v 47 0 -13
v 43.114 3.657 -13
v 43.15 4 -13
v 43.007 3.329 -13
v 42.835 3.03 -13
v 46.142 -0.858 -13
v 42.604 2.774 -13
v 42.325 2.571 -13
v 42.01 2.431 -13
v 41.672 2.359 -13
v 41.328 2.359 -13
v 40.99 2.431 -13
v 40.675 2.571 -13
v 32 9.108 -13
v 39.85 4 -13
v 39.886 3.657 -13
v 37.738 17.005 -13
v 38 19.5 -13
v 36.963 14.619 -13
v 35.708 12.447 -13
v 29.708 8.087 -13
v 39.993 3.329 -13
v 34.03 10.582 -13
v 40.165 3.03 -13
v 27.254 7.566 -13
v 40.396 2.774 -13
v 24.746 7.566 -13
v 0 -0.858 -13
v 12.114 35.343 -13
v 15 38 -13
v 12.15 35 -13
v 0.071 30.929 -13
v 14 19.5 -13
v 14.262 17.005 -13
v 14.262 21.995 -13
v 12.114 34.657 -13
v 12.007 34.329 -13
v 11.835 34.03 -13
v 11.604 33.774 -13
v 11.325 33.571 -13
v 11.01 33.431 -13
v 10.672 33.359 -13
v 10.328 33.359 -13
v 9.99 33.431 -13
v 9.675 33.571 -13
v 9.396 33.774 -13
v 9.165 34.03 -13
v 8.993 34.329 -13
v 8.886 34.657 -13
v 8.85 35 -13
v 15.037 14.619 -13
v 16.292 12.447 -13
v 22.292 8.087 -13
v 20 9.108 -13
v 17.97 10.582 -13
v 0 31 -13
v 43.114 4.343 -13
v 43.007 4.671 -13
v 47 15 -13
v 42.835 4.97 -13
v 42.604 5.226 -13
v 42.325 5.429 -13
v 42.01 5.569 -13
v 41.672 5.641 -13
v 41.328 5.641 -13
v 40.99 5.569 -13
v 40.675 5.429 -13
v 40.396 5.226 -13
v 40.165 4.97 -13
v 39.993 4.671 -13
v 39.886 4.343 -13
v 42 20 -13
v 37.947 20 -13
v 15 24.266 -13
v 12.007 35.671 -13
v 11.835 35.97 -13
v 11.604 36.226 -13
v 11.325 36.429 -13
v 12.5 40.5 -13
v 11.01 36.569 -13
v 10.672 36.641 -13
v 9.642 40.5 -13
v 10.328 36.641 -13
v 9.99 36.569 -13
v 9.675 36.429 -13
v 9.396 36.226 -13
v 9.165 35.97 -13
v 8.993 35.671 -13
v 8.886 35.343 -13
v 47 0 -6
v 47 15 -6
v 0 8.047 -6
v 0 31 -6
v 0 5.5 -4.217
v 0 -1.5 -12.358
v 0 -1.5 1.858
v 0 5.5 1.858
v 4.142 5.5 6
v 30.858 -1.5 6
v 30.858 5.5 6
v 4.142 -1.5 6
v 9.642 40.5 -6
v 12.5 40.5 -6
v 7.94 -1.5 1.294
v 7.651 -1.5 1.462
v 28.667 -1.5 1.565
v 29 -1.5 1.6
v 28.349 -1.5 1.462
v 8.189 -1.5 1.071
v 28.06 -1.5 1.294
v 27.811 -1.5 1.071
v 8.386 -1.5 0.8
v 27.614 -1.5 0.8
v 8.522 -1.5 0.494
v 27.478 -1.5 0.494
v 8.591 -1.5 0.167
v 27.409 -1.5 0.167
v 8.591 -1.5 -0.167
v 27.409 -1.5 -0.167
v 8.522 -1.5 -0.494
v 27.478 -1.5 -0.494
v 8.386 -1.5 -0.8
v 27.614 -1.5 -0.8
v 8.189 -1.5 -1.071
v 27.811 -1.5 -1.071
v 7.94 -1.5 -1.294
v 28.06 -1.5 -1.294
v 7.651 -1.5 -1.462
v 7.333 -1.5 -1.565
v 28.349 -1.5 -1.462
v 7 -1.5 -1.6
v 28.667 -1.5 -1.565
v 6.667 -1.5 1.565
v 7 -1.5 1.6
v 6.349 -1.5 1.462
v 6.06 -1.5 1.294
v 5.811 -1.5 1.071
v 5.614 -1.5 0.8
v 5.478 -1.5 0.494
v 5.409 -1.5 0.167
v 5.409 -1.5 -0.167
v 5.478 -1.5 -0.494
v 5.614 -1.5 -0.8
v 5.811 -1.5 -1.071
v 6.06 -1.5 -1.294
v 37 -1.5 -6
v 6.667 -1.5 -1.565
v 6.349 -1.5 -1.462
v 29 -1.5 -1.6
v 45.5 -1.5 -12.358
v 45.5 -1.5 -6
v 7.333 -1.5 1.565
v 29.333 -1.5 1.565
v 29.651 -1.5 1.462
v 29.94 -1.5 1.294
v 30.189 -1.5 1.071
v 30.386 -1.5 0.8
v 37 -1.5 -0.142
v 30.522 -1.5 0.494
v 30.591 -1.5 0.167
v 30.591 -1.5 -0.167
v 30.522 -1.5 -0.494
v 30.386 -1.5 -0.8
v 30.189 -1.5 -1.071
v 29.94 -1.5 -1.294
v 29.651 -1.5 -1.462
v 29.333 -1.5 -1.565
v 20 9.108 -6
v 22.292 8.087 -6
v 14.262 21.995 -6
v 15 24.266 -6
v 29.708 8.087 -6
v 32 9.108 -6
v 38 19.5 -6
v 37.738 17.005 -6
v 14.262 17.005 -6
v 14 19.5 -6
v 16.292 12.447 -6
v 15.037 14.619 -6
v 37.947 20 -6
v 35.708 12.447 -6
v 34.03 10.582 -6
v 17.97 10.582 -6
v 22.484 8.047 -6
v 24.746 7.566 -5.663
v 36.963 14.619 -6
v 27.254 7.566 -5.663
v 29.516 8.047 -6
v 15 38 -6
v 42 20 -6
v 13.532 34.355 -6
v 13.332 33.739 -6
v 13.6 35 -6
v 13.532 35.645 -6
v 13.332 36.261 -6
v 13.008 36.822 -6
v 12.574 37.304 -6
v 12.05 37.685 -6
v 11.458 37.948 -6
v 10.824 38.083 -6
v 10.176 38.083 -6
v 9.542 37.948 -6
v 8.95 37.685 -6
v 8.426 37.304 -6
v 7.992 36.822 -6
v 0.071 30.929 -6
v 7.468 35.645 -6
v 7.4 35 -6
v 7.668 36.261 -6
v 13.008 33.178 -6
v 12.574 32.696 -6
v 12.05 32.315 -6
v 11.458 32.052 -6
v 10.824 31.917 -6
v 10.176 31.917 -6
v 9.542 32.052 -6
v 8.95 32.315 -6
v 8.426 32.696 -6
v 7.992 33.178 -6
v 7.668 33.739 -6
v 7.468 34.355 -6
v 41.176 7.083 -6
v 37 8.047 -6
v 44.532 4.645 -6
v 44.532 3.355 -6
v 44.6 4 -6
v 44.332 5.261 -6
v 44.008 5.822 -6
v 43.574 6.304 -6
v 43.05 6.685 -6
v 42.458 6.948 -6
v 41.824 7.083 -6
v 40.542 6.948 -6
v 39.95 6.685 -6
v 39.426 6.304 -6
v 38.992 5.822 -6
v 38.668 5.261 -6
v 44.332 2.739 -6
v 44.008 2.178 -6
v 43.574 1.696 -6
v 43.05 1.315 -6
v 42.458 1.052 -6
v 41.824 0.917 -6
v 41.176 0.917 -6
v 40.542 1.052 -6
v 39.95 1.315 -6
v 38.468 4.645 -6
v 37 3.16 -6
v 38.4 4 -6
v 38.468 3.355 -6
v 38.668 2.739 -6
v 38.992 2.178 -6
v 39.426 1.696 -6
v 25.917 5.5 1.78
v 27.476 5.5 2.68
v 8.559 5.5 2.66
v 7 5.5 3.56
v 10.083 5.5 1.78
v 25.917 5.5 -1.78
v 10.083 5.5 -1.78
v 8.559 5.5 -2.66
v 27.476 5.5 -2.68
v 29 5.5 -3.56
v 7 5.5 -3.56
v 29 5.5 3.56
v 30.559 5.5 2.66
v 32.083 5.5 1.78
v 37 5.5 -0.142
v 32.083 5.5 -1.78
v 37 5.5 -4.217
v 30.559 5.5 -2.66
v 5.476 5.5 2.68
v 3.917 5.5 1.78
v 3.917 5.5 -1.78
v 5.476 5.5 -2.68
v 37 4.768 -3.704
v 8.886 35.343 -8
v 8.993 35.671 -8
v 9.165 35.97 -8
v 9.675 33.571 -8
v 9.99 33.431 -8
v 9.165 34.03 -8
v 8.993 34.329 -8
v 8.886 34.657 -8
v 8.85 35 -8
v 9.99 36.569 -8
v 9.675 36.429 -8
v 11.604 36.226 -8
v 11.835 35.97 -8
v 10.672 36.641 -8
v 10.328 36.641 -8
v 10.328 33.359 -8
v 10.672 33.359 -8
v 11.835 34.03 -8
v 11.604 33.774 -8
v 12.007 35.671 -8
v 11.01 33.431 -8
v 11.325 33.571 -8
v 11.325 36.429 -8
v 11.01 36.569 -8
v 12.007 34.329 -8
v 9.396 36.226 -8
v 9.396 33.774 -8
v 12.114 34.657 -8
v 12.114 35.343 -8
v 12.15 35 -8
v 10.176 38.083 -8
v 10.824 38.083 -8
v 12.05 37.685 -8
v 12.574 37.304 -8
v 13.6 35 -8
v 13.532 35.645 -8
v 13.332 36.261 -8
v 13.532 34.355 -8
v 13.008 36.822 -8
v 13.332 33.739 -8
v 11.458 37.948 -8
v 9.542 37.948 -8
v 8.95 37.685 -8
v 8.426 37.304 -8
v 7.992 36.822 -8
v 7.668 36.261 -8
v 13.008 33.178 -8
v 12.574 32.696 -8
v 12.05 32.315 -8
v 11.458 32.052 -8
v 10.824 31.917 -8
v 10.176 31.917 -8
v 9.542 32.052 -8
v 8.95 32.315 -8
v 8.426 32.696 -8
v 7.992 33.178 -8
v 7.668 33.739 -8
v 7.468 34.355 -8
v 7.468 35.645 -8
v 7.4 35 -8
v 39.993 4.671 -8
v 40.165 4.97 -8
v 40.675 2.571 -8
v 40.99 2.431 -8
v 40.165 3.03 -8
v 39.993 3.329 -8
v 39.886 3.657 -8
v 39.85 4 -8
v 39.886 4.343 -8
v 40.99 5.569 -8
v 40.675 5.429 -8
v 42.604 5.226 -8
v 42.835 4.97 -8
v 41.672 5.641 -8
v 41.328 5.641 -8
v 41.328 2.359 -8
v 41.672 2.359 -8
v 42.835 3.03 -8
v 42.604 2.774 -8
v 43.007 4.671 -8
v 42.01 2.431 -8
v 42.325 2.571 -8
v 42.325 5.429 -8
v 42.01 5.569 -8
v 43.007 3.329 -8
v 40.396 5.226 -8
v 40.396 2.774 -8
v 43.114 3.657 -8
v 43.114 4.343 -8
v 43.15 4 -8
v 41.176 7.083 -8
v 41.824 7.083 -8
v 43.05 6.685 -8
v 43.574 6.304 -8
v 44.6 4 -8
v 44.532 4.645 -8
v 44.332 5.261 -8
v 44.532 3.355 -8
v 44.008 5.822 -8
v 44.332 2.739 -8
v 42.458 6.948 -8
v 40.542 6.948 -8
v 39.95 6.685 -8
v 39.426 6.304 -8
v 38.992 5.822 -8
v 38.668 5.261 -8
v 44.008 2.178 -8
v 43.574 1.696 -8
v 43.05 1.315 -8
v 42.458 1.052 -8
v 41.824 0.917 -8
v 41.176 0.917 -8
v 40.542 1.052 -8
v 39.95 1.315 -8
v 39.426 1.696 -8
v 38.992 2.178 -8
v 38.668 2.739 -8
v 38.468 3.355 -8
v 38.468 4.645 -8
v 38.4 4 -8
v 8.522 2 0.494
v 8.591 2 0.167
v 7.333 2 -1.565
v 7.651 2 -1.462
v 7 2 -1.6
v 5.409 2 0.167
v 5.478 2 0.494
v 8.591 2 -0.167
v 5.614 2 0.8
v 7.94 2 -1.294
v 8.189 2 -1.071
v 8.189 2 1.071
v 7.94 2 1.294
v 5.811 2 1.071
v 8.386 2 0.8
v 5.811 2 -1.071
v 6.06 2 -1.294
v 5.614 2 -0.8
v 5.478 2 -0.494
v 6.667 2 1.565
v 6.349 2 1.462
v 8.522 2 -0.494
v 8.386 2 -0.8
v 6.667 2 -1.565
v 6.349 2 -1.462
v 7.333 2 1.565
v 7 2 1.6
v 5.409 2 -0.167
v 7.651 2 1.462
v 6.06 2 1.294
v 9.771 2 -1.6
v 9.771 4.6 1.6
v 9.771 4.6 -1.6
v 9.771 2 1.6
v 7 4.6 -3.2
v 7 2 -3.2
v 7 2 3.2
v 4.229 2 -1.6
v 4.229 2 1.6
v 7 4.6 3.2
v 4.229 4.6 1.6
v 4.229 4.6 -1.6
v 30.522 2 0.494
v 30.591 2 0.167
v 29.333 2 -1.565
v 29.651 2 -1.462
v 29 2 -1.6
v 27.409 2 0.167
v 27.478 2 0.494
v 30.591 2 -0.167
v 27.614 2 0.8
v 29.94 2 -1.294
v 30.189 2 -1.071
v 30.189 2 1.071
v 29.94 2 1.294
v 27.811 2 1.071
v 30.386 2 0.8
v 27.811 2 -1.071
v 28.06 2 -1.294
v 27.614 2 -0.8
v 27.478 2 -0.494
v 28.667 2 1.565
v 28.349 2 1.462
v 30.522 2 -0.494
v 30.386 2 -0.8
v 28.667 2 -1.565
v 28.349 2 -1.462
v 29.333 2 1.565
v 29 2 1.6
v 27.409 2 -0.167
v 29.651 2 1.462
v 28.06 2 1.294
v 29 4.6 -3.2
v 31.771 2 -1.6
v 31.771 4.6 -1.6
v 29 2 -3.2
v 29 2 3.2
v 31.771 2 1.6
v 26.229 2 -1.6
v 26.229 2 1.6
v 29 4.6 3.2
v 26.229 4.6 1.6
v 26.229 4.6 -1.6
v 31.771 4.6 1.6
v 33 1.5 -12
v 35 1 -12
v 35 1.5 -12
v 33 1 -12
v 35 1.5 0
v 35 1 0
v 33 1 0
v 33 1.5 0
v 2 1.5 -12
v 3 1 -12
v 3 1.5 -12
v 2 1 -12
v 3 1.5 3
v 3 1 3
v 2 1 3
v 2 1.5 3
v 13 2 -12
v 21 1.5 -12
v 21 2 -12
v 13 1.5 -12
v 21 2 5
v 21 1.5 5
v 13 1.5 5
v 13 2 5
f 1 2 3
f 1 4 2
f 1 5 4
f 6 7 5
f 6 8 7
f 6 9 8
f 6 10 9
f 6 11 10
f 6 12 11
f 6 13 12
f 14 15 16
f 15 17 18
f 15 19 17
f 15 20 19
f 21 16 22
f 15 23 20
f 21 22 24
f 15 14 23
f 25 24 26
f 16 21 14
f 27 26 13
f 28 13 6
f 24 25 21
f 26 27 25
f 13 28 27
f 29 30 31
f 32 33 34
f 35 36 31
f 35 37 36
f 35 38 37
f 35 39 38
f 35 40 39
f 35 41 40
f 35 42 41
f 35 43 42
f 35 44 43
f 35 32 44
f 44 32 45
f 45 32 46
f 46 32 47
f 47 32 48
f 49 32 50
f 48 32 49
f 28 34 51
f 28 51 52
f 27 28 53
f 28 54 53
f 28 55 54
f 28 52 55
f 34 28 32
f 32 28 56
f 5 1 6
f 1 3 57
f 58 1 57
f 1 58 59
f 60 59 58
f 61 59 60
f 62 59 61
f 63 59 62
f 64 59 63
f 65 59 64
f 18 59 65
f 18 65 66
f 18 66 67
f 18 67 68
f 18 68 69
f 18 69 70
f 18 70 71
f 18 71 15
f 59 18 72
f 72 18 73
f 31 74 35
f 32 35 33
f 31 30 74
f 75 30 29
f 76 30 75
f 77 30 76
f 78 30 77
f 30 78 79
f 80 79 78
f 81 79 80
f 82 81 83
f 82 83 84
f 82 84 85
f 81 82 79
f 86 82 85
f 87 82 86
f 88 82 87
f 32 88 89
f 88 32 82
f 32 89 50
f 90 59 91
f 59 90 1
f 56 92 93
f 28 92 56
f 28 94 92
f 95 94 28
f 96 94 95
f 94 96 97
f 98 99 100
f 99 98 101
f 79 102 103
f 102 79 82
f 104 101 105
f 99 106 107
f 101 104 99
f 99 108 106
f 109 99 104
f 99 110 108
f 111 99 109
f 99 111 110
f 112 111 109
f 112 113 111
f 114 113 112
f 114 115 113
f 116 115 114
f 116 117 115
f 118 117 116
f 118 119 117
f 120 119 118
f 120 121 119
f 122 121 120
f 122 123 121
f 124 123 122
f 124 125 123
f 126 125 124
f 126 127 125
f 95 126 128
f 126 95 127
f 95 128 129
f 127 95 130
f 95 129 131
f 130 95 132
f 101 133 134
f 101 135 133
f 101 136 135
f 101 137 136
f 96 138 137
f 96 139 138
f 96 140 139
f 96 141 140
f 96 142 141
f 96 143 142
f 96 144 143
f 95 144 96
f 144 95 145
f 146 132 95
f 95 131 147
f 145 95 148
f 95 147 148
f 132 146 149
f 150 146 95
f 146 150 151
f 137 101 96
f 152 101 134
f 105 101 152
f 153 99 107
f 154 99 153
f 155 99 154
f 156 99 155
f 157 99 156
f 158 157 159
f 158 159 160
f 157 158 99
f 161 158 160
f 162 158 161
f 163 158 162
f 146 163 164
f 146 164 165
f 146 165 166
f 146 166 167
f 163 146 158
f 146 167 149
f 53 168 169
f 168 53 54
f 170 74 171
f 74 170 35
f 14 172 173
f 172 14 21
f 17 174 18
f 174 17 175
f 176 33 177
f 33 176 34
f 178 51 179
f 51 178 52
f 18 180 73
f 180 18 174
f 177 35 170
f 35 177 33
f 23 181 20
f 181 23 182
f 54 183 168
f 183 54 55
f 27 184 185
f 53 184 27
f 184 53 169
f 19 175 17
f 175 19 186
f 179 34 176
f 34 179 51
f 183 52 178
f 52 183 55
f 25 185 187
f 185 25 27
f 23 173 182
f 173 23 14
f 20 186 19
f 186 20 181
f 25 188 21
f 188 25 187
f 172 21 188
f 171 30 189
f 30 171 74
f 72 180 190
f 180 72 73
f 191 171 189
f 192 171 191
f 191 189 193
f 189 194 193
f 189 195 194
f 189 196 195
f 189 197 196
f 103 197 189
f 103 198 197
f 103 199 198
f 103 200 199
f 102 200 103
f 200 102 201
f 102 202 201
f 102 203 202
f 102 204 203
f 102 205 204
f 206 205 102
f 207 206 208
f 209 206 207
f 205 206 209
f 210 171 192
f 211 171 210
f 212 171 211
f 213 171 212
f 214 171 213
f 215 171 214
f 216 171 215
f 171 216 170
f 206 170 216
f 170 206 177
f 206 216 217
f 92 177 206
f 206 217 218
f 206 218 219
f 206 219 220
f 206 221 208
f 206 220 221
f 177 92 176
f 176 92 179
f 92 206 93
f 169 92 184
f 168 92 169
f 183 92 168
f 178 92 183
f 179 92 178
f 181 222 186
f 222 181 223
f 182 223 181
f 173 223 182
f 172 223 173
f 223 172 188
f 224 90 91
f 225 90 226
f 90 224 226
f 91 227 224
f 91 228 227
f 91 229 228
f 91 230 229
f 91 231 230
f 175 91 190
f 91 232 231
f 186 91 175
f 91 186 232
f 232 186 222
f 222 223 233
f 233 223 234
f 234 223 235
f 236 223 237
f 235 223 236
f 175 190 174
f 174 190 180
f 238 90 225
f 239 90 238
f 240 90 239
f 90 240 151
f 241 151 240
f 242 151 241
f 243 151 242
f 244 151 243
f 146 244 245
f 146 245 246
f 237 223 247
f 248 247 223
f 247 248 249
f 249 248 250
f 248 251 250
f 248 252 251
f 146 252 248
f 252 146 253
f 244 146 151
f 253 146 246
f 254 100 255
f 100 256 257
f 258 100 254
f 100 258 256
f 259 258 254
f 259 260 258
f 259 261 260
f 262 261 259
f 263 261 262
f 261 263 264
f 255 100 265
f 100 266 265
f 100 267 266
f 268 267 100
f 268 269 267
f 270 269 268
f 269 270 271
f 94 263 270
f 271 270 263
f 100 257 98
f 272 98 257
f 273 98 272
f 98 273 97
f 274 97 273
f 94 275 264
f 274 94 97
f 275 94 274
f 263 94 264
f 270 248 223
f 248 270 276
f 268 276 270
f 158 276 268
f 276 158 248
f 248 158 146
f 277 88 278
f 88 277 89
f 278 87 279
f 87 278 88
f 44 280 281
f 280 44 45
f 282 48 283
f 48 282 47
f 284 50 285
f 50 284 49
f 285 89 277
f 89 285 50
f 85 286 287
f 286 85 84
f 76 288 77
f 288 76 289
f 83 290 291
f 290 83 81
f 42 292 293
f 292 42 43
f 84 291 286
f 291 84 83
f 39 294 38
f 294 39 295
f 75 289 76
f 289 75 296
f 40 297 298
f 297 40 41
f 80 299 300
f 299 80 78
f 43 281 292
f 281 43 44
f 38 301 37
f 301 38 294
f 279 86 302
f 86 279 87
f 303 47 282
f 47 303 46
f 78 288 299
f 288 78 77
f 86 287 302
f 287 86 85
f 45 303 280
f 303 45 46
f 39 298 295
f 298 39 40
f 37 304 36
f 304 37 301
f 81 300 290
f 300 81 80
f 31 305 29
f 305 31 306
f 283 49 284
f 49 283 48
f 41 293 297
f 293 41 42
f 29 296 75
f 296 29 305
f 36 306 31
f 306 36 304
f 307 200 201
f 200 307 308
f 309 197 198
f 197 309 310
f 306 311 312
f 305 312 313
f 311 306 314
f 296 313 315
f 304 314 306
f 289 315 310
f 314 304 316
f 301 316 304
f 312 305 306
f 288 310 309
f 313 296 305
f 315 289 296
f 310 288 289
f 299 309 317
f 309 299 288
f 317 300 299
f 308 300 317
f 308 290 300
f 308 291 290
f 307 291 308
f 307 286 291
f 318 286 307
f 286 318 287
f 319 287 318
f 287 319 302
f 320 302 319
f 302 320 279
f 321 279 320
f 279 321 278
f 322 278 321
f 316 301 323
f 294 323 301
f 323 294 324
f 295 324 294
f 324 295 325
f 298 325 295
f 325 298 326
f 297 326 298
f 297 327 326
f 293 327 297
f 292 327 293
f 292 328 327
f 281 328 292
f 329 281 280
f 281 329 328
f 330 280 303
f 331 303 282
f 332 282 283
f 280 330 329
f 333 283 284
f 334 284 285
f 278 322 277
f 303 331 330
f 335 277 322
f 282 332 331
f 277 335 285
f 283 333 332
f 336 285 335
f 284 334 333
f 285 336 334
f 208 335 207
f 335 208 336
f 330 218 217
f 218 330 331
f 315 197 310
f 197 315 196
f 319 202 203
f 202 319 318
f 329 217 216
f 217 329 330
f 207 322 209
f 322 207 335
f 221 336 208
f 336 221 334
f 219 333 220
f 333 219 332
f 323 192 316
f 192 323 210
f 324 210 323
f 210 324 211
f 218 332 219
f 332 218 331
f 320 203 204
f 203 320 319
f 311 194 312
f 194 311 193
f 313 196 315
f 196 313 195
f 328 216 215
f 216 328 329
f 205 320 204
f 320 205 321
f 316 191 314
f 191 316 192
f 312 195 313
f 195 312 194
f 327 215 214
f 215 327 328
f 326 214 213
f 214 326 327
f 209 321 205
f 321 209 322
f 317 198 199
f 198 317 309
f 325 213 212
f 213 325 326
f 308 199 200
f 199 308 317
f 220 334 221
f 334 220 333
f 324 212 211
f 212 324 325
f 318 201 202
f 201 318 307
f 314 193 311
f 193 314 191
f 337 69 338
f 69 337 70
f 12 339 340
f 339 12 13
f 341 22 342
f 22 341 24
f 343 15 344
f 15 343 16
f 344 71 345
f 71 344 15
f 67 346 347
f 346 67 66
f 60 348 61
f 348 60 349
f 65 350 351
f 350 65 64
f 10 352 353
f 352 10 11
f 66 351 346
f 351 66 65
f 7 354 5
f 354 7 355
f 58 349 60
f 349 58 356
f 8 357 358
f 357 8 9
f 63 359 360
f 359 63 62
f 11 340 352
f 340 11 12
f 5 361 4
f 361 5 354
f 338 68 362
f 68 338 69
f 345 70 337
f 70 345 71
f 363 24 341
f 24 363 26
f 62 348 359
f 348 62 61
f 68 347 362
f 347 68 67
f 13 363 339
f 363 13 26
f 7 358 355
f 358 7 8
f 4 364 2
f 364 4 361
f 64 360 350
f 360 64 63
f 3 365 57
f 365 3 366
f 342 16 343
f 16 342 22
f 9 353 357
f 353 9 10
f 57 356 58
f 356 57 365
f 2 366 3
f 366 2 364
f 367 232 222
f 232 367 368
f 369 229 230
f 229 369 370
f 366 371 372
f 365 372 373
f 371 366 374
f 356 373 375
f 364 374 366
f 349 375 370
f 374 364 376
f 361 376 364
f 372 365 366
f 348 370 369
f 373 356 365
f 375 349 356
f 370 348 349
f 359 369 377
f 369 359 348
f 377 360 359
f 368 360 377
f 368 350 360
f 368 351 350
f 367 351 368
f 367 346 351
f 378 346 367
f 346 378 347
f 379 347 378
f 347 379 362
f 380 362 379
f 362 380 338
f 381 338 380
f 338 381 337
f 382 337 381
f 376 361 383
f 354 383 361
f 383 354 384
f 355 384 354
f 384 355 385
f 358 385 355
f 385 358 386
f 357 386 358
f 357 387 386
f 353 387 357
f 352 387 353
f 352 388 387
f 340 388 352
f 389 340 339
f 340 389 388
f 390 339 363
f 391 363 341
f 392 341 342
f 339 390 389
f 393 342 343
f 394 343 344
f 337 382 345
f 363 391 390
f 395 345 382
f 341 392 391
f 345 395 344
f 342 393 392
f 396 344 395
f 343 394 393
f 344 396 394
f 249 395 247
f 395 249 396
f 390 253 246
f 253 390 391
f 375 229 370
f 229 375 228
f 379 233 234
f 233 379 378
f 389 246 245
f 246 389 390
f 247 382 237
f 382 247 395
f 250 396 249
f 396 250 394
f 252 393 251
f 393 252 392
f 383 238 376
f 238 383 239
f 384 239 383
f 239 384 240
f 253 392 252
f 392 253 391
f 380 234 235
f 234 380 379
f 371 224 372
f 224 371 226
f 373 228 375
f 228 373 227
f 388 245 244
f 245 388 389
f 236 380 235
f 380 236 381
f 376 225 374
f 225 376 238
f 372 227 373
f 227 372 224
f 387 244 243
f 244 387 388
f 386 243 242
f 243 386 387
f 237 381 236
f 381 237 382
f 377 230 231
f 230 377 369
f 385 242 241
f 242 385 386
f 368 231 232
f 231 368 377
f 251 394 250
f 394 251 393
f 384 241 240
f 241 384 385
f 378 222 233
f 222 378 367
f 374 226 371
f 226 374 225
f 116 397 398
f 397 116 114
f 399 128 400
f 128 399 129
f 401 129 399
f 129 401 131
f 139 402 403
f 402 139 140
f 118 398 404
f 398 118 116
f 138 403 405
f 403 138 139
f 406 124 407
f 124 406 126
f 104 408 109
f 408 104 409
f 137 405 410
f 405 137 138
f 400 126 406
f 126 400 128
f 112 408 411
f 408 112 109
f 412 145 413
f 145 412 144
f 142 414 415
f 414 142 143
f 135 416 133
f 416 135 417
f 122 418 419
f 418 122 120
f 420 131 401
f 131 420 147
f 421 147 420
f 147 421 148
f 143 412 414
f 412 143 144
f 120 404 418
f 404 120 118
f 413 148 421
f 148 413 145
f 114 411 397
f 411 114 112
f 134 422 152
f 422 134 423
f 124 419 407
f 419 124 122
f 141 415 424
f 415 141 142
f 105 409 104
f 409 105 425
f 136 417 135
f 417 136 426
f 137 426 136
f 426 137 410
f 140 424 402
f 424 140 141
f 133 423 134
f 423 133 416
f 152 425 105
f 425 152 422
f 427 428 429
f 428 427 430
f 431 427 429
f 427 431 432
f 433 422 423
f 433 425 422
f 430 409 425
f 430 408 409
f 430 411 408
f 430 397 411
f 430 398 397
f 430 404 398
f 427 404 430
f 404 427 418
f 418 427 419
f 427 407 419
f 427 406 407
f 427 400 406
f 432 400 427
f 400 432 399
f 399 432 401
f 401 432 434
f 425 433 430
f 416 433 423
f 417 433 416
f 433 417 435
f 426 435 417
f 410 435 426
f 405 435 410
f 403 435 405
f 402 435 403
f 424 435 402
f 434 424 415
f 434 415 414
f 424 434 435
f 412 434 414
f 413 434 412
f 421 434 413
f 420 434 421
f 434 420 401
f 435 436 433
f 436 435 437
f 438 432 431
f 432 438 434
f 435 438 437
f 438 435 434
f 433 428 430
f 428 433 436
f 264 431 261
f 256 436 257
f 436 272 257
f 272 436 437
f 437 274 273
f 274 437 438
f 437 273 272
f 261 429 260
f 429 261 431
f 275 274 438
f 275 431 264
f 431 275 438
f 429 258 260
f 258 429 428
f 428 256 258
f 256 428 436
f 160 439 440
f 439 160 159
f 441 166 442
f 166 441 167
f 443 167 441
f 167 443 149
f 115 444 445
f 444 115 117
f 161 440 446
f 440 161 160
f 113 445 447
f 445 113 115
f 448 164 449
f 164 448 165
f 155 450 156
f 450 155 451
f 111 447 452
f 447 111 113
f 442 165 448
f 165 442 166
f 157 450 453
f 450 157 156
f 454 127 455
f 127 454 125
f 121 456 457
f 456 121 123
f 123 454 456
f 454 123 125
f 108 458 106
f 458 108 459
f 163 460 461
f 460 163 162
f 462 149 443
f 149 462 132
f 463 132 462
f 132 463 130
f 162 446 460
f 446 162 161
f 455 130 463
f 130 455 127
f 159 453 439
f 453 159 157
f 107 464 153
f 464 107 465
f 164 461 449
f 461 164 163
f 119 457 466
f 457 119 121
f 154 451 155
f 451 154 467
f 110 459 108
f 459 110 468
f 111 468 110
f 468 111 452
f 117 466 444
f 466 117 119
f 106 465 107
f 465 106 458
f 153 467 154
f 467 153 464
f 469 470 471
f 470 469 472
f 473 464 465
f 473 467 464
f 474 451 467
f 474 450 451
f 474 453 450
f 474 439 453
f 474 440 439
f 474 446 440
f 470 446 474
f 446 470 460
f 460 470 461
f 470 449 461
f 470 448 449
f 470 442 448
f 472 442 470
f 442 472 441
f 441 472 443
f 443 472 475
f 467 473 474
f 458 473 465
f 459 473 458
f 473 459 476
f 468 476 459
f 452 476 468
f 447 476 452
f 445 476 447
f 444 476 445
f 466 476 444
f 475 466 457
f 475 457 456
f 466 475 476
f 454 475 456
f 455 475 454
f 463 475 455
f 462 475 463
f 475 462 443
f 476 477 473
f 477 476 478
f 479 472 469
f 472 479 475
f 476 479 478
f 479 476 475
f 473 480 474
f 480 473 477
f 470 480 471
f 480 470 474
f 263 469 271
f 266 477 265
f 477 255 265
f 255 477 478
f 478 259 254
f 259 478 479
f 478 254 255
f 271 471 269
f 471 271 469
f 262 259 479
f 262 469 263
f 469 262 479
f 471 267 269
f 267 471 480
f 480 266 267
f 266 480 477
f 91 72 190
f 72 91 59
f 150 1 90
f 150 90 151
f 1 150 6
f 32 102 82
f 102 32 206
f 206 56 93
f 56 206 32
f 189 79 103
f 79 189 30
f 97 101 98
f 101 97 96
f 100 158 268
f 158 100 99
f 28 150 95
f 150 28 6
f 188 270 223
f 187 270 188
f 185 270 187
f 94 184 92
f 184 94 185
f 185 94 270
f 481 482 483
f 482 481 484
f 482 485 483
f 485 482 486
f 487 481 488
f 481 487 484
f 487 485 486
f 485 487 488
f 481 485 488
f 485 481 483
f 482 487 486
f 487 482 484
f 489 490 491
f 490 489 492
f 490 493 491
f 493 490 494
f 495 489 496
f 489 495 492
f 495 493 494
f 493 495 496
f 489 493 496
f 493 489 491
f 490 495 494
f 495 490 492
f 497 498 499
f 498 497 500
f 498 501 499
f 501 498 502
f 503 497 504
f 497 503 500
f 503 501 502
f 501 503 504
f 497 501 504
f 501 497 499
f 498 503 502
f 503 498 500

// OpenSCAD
// PRUSA iteration4
// Y motor holder
// GNU GPL v3
// Josef Průša <iam@josefprusa.cz> and contributors
// http://www.reprap.org/wiki/Prusa_Mendel
// http://prusamendel.org

module holder()
{
    difference()
    {
        // base body
        translate([-6,-1.5,0]) cube([19,42,47]);

        // shape cuts
        translate([-20,19.5,26]) rotate([0,90,0]) cylinder( h=35, r=12, $fn=30 );   
        translate([-11,20,15]) cube([26,23,64]);
        translate([-20,5.5,-1]) cube([26,41,64]);
        translate([-20,-5,37]) cube([26,21,20]);
        translate([-20,-1,37]) cube([26,30,20]);
        
        // lower motor screw
        translate([-20,35 ,10.5]) rotate([0,90,0]) cylinder( h=40, r=1.65, $fn=30 ); 
        translate([-7,35,10.5]) rotate([0,90,0]) cylinder( h=15, r=3.1, $fn=30 );         
        
        // upper motor screw    
        translate([-20,4,41.5]) rotate([0,90,0]) cylinder( h=40, r=1.65, $fn=30 );         
        translate([4,4,41.5]) rotate([0,90,0]) cylinder( h=4, r=3.1, $fn=30 );         
        
        // lower frame screw    
        translate([0,12,7]) rotate([90,0,0]) cylinder( h=40, r=1.6, $fn=30 ); 
        translate([0,7,7]) rotate([90,0,0]) cylinder( h=5, r=3.2, $fn=6 ); 
        translate([0,6.6,7]) rotate([90,0,0]) cylinder( h=2, r2=3.2, r1=4, $fn=6 ); 
        
        // upper frame screw    
        translate([0,12,29]) rotate([90,0,0]) cylinder( h=40, r=1.6, $fn=30 ); 
        translate([0,7,29]) rotate([90,0,0]) cylinder( h=5, r=3.2, $fn=6 ); 
        translate([0,6.6,29]) rotate([90,0,0]) cylinder( h=2, r2=3.2, r1=4, $fn=6 );

        // corners
        translate([-10,20,42]) rotate([45,0,0]) cube([60,10,10]);        
        translate([-10,-5,42]) rotate([45,0,0]) cube([60,10,10]);        
        translate([-10,38,-7]) rotate([45,0,0]) cube([60,20,10]);        
        translate([-10,43,10]) rotate([45,0,0]) cube([60,20,20]);  
        translate([-14,-10,-2]) rotate([0,45,0]) cube([10,50,10]);        
        translate([-14,-10,37]) rotate([0,45,0]) cube([10,50,10]);        
        translate([18,-10,-5]) rotate([0,0,45]) cube([10,10,60]);        
    }
    
    // reinforcement
    translate([7.8,1.9,0]) rotate([0,0,55]) cube([5,5,18]);
    difference()
        {
            translate([7.8,1.9,13.6]) rotate([0,0,55]) cube([5,5,23.4]);
            translate([-20,19.5,26]) rotate([0,90,0]) cylinder( h=35, r=12, $fn=30 );   
        }
   
}
 
module y_motor_holder()
{
    rotate([0,90,0])
    difference()
        {
        holder();
       
        // selective infill
        translate([-0,1,33]) cube([12,0.5,2]);        
        translate([-3,1,2]) cube([15,0.5,1]);        
        translate([-5,1.5,13]) cube([17,0.5,8]);        
        
        //version
        //translate([-1,-1,15]) rotate([90,0,0]) linear_extrude(height = 0.6) 
        //{ text("R1",font = "helvetica:style=Bold", size=5, center=true); }
        }
}    
    
y_motor_holder();    
    
    
    
